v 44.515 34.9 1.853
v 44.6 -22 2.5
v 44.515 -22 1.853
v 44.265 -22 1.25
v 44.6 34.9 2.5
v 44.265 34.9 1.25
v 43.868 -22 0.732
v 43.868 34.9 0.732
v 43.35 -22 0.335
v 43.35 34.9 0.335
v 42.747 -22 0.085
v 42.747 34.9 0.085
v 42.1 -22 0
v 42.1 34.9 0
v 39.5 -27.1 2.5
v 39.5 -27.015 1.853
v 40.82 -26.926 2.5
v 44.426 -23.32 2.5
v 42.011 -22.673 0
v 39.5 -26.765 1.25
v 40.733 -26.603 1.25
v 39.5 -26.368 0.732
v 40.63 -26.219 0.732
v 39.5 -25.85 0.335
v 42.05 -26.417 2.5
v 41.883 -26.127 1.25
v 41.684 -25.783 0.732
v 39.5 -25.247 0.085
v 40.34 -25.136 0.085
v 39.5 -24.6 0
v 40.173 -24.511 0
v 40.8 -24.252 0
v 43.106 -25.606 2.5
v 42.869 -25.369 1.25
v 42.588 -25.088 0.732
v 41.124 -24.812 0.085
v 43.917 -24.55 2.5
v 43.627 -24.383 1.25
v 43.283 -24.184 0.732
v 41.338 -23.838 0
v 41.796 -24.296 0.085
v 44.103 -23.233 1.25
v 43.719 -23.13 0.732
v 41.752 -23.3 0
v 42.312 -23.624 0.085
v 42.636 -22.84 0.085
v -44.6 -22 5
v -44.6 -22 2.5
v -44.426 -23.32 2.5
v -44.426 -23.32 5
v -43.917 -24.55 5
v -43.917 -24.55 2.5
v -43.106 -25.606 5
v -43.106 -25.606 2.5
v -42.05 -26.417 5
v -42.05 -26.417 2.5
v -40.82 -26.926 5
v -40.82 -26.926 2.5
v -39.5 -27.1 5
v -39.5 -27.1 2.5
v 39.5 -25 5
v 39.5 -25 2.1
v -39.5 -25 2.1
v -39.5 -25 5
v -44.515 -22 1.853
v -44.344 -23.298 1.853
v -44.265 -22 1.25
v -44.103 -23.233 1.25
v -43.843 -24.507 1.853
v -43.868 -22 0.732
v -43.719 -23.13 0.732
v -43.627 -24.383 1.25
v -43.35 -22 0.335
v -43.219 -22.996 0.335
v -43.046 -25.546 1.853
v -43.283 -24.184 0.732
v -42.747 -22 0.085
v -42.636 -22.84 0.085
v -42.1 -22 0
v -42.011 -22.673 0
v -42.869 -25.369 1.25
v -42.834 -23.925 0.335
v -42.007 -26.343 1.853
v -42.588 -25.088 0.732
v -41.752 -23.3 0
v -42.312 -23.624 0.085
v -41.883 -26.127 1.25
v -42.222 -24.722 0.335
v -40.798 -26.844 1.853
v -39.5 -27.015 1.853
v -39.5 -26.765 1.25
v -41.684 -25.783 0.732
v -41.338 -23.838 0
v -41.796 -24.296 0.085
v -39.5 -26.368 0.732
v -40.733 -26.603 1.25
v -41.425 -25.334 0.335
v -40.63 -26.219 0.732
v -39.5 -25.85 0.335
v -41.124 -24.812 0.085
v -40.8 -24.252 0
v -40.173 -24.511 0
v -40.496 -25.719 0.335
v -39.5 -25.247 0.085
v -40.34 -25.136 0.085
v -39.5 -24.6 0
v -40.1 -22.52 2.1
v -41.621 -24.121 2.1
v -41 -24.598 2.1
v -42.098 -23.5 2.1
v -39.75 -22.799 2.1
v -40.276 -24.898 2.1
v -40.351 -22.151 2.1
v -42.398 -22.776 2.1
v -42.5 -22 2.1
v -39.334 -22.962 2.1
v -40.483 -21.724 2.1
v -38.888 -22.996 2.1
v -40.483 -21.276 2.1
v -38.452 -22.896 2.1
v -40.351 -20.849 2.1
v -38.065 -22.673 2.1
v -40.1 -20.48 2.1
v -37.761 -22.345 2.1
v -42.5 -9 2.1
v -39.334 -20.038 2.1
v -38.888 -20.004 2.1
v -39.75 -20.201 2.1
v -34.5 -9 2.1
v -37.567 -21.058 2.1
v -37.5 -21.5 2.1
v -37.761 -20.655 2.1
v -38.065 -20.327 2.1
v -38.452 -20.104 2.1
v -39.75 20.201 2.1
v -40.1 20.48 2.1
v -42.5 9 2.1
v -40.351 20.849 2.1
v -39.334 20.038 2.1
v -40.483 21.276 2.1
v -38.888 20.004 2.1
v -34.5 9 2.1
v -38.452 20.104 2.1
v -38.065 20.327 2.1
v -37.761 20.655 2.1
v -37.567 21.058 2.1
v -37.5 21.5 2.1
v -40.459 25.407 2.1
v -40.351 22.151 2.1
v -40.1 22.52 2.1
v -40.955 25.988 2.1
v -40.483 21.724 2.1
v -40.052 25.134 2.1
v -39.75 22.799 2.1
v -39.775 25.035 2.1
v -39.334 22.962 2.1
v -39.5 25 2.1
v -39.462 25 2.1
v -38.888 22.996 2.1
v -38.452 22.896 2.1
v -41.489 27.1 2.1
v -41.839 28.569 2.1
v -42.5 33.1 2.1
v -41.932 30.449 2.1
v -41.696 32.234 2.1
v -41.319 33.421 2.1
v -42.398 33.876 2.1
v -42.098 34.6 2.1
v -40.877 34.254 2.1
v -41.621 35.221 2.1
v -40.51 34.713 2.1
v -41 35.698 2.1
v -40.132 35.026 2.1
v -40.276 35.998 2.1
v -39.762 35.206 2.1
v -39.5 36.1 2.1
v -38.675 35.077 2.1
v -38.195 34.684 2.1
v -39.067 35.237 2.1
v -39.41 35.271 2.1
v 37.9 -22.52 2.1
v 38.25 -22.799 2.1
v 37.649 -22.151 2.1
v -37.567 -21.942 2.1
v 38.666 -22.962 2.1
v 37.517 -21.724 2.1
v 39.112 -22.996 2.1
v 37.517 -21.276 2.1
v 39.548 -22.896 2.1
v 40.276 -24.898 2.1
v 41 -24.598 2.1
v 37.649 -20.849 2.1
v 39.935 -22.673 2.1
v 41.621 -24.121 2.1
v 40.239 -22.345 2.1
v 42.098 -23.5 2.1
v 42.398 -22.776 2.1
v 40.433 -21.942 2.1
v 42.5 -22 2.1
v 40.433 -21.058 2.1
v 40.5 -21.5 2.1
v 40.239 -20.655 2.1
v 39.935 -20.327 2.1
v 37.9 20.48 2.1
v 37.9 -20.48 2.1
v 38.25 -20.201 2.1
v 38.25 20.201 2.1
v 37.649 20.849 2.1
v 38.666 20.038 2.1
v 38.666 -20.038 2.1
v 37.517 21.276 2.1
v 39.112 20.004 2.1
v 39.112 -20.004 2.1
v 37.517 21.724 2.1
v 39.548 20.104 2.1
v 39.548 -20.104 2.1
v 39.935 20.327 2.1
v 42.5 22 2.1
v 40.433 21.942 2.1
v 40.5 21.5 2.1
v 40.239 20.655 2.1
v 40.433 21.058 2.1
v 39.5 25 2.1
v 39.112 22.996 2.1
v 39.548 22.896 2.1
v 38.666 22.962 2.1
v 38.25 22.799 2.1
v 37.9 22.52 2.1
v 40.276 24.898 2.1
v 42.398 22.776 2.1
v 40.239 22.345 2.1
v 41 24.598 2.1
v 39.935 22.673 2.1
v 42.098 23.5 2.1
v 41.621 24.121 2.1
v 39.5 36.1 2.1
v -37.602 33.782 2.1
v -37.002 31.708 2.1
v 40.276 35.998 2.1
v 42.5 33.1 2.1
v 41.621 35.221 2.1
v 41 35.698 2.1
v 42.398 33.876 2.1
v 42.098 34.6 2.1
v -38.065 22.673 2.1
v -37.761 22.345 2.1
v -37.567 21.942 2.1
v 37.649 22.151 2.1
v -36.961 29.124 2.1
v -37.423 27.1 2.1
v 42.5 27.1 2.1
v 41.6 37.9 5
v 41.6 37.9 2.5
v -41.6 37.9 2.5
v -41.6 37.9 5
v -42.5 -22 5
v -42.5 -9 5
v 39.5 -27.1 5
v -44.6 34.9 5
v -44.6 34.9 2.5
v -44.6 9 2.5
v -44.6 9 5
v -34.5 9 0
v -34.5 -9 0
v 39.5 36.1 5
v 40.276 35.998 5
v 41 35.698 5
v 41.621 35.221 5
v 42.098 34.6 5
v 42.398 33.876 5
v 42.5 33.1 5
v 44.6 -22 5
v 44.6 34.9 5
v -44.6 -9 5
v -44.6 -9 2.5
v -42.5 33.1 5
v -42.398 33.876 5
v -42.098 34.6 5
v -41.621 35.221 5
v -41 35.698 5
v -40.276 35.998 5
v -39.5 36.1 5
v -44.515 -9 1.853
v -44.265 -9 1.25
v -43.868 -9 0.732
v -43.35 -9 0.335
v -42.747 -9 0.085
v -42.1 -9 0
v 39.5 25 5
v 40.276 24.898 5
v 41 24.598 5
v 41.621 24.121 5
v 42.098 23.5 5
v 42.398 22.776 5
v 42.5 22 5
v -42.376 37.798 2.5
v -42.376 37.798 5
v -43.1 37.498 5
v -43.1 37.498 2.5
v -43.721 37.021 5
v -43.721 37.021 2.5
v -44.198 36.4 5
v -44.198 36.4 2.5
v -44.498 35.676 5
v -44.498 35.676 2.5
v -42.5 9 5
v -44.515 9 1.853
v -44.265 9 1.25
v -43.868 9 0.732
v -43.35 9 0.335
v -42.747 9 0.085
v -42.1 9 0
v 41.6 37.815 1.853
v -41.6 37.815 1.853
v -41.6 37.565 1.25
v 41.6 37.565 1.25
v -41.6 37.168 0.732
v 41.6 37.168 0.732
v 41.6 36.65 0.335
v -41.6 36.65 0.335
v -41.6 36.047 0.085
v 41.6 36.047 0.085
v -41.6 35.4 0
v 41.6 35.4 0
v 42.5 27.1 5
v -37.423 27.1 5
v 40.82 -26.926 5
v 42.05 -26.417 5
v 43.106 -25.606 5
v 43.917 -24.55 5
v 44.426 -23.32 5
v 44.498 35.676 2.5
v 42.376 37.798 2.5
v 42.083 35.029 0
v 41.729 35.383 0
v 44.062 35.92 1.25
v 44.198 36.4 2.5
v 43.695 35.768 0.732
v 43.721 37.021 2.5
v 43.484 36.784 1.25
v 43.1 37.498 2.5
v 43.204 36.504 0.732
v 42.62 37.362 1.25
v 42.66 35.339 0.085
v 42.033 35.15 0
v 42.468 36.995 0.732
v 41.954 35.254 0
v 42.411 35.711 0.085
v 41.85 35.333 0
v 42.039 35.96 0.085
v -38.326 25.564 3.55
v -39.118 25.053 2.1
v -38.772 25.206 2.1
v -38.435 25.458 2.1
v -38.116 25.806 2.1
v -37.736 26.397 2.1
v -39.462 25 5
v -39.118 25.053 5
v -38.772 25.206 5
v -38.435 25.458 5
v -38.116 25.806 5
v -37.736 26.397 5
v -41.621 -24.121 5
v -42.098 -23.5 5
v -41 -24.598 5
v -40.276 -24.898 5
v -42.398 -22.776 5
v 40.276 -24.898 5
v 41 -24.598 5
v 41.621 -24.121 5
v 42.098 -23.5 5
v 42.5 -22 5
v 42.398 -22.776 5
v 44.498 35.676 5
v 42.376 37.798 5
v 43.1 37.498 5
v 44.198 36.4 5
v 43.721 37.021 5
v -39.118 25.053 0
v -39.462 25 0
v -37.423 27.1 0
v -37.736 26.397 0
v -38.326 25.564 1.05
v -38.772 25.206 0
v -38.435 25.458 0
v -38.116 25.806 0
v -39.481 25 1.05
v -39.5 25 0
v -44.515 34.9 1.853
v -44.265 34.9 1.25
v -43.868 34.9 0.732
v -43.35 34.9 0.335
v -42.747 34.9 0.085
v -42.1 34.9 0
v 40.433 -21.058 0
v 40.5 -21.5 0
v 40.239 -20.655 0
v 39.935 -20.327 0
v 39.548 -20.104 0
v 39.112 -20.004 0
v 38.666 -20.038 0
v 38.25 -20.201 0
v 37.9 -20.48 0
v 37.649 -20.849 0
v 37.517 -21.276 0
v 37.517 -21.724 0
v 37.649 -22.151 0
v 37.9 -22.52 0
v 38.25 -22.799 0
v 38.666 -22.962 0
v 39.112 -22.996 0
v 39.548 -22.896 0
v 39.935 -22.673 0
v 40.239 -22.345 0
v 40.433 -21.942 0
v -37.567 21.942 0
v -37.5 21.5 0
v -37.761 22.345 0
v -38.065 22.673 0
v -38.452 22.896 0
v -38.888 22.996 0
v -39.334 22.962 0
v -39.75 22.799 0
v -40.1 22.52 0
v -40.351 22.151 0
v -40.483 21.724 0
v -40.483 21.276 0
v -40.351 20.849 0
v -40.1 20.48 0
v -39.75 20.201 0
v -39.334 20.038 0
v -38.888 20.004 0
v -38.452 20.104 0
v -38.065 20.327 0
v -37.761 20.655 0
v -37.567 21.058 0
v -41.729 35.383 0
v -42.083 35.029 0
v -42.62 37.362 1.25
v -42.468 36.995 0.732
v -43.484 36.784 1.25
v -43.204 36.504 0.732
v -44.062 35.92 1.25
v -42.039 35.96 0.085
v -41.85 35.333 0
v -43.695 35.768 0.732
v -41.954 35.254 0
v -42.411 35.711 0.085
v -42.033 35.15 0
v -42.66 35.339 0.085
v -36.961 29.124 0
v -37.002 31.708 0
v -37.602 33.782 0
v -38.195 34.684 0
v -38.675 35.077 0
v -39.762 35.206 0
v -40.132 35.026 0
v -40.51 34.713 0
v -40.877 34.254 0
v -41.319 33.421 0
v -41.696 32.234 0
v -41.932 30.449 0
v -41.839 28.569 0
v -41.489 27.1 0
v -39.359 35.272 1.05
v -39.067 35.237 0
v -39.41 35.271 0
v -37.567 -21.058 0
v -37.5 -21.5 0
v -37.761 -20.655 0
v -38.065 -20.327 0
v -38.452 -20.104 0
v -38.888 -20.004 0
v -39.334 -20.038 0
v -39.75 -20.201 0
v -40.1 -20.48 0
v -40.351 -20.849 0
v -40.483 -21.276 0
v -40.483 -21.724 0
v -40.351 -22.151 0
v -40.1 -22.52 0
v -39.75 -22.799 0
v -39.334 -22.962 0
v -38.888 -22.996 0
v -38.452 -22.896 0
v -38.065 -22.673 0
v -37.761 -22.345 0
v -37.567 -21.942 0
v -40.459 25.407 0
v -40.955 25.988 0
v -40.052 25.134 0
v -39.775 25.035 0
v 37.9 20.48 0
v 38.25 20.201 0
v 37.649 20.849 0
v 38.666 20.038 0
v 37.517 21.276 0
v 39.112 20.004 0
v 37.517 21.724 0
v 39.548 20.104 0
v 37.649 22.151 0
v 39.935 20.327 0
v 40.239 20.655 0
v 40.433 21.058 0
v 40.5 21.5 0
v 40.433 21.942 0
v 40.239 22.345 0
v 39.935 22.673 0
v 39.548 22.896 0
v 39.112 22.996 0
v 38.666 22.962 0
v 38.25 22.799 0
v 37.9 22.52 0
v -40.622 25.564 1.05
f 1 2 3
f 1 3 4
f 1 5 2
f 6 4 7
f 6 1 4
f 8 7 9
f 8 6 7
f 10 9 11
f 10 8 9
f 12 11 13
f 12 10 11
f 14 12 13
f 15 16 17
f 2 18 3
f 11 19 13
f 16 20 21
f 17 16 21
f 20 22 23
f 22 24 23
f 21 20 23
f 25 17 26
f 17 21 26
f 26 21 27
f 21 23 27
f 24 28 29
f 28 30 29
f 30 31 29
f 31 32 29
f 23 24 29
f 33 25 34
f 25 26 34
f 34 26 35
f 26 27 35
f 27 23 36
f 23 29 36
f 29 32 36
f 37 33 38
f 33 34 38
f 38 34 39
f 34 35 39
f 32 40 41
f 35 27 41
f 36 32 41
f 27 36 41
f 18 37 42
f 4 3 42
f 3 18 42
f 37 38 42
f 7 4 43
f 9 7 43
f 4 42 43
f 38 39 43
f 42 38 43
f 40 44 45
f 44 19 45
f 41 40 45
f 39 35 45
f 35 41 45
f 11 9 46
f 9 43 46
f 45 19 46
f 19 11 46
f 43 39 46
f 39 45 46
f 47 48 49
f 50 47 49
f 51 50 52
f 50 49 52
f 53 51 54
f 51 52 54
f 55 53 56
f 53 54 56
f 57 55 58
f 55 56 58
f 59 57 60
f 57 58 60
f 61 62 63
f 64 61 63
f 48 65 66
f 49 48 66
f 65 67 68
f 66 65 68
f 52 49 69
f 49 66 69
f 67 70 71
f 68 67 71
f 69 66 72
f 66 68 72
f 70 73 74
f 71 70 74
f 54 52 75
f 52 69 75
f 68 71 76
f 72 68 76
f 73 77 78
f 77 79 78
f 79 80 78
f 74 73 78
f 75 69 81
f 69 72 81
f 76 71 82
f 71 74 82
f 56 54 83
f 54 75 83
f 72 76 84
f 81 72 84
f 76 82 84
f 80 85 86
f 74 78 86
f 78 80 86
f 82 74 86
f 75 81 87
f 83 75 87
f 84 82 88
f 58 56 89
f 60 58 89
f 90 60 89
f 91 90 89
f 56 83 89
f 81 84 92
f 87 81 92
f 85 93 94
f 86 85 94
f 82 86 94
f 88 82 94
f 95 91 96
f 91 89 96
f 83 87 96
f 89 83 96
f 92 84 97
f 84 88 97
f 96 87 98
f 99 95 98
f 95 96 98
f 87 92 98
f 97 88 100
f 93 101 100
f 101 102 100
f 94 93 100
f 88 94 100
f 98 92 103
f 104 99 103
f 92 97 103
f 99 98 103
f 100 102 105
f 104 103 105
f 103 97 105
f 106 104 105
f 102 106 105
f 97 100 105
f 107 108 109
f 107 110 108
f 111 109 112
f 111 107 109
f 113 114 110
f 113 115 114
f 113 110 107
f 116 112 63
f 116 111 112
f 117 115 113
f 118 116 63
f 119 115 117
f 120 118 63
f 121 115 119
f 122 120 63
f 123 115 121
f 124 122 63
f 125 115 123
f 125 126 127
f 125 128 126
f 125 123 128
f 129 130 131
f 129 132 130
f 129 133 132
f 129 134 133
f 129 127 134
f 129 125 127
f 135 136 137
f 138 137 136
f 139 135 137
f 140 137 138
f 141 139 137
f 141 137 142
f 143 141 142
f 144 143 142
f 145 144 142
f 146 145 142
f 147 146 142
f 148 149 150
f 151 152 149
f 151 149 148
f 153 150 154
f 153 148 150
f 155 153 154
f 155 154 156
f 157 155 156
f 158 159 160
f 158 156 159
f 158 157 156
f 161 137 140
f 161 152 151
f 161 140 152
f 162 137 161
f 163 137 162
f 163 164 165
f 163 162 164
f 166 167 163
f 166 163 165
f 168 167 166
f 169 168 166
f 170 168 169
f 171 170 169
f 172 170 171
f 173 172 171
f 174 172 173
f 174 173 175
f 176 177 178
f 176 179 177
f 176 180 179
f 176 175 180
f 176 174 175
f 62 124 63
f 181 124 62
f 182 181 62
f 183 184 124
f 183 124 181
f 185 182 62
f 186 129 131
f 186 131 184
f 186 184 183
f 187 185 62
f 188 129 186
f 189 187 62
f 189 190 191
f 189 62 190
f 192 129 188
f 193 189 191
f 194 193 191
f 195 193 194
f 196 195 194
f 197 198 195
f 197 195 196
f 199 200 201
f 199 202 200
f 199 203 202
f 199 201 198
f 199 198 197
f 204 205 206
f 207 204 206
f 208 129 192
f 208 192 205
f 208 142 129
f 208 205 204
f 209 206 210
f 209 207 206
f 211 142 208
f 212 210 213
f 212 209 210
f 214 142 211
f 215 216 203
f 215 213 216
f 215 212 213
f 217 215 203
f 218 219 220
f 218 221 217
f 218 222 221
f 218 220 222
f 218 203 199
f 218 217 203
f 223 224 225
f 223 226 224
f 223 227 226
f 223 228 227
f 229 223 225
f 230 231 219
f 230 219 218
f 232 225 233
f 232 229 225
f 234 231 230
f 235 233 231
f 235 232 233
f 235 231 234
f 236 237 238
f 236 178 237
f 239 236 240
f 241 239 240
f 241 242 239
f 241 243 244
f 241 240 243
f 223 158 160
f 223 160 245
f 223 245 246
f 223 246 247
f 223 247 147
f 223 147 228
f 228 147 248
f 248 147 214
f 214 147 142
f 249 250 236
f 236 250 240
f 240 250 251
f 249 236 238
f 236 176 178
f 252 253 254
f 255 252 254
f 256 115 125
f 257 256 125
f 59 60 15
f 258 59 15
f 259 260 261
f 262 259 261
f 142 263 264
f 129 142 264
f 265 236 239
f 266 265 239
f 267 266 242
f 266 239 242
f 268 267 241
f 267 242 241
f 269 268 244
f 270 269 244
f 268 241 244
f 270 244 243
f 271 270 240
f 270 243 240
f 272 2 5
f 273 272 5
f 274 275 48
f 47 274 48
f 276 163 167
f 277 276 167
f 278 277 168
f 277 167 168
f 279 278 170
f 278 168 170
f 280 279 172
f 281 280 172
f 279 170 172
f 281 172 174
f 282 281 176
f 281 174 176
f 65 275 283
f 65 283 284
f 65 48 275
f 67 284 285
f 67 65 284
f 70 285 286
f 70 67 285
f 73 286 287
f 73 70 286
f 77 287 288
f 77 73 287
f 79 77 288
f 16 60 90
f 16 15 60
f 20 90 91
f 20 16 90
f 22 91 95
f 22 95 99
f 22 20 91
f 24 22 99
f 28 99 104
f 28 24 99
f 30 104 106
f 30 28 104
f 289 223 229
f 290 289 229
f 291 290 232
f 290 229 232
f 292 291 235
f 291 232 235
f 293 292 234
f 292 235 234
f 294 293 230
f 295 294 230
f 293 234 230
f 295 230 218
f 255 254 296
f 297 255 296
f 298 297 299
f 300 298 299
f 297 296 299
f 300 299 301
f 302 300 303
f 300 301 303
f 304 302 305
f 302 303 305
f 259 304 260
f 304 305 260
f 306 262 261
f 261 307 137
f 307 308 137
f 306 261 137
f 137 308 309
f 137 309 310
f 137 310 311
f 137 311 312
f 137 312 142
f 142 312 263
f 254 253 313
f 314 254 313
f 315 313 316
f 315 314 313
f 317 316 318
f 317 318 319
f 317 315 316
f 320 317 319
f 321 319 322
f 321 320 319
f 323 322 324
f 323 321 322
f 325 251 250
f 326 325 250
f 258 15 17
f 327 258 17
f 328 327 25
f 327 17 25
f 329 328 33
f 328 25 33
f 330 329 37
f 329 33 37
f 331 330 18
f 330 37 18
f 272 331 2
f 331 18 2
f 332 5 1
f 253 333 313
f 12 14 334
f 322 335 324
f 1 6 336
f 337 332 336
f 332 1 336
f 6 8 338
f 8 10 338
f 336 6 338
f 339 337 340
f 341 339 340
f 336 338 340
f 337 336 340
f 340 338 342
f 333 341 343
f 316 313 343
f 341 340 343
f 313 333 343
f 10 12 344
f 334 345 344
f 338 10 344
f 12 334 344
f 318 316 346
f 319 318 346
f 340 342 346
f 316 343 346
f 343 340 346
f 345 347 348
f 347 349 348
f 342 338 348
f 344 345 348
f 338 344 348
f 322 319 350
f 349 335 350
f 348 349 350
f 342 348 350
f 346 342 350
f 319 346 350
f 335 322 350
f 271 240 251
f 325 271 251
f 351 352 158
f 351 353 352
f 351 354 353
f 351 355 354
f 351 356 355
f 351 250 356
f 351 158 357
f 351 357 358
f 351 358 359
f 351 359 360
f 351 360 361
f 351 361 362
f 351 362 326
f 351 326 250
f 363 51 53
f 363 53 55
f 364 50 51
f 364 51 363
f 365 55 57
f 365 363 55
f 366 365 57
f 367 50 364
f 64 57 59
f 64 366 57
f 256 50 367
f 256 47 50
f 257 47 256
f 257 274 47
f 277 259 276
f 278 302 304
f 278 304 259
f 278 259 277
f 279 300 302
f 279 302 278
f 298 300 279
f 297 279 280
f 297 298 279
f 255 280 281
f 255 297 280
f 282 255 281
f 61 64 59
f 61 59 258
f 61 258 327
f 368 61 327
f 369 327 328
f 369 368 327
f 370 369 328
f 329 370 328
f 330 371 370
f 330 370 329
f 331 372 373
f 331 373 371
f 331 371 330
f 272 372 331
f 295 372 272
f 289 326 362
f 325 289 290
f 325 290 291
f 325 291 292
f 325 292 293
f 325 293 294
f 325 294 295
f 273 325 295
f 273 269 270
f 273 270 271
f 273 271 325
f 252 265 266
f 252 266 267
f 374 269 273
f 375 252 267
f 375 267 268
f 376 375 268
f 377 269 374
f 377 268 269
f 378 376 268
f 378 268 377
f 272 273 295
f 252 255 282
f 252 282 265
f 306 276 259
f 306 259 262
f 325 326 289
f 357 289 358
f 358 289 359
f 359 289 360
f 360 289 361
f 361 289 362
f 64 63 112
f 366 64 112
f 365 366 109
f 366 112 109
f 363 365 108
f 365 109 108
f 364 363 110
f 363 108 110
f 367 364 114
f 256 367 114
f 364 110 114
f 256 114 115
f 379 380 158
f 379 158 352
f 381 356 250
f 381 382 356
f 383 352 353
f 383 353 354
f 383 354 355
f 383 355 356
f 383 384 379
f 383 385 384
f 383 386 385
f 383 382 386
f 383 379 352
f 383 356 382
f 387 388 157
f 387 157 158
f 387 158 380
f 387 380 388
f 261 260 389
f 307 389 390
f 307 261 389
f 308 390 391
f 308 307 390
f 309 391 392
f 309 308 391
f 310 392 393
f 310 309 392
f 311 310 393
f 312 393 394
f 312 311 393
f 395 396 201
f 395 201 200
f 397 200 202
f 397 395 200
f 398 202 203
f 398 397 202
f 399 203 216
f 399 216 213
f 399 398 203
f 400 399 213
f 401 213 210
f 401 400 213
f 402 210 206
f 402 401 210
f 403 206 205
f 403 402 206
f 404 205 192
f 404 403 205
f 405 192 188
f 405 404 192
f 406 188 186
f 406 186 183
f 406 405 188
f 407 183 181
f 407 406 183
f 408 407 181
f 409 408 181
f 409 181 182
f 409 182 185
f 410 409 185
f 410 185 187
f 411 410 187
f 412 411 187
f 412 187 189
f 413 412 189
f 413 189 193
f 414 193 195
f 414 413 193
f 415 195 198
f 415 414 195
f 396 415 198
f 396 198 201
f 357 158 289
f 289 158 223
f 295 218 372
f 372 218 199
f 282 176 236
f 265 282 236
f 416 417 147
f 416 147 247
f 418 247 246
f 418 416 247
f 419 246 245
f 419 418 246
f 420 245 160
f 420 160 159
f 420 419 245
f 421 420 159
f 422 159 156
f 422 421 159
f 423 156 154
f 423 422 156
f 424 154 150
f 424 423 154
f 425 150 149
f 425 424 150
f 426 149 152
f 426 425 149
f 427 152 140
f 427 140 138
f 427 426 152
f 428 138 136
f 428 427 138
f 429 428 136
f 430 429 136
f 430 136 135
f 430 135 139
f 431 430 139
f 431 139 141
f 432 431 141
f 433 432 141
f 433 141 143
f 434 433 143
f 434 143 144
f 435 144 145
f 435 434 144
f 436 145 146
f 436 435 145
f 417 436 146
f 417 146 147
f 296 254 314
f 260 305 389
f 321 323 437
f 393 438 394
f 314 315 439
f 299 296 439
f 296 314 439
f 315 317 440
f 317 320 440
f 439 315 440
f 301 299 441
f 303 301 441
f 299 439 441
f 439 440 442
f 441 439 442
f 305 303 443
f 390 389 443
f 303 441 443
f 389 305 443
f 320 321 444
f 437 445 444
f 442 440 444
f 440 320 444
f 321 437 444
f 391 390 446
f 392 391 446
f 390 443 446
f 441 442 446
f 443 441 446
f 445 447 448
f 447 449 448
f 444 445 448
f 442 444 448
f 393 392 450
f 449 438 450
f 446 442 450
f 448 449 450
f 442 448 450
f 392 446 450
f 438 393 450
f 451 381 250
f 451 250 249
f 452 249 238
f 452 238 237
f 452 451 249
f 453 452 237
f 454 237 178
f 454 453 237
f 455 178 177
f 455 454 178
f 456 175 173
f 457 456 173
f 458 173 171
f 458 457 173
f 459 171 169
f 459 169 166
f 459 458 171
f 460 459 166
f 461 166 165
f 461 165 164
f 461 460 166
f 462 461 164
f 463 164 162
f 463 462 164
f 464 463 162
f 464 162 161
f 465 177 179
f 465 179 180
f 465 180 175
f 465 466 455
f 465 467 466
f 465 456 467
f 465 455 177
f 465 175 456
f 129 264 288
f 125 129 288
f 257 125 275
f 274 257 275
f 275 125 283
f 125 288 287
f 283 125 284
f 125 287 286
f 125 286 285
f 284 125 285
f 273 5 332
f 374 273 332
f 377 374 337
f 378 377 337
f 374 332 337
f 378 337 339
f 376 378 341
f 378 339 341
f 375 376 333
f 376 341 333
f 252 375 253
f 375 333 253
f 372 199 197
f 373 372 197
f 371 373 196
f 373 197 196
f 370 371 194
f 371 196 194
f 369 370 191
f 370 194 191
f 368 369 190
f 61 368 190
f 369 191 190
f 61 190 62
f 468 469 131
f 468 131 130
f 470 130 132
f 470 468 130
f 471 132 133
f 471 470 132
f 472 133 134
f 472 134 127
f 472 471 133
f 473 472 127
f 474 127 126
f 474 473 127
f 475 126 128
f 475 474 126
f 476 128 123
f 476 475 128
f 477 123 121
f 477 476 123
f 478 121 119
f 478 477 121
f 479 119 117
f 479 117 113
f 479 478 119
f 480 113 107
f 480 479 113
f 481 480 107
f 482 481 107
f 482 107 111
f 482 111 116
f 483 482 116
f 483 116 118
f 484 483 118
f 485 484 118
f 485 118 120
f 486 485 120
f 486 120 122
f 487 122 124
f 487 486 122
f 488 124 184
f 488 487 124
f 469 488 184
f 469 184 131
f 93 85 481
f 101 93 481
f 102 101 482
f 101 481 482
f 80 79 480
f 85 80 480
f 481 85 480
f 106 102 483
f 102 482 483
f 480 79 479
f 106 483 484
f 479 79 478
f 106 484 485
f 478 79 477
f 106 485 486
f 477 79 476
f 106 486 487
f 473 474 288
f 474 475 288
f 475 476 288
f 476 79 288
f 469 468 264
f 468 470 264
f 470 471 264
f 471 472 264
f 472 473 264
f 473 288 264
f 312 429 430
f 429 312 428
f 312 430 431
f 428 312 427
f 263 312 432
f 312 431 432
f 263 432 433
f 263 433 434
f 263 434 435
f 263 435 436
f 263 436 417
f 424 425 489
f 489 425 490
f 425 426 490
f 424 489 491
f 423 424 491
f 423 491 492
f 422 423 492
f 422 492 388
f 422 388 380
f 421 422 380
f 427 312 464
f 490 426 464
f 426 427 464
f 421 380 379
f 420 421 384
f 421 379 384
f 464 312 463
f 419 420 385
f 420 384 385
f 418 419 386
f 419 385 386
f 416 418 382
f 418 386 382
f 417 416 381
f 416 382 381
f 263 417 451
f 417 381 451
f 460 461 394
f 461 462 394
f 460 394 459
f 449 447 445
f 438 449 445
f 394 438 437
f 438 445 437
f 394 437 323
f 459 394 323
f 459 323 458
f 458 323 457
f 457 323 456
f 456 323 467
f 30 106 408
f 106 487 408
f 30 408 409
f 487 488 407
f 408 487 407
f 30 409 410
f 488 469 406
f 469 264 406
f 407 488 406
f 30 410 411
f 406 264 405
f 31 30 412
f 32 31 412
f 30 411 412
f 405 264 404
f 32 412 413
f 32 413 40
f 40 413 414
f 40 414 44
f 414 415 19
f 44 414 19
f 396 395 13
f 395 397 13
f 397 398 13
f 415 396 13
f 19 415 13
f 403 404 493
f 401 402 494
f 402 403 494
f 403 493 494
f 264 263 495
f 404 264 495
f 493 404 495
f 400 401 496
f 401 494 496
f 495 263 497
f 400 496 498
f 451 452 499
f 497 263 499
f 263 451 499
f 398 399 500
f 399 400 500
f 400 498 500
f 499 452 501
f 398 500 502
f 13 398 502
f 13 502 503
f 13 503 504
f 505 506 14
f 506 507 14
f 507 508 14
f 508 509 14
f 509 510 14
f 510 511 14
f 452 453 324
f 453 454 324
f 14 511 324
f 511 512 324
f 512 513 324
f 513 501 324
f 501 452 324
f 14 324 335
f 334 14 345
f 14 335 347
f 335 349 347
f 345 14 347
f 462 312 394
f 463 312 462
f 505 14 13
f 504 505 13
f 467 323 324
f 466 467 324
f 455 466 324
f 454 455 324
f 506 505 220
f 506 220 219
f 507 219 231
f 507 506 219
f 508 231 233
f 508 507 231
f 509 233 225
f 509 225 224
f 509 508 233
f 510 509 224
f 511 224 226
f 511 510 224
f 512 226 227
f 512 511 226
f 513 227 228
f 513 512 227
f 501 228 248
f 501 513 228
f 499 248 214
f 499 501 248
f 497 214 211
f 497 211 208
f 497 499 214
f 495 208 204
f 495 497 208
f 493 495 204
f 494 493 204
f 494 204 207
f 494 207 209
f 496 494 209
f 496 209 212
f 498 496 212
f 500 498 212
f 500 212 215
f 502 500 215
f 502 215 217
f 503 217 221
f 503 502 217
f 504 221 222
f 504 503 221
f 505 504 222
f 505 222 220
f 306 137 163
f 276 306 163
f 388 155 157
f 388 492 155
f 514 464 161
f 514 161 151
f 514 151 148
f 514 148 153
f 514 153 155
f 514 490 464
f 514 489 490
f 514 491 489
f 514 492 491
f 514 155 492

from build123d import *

# Parameters (mm, degrees)
F0_R     = 1.5
F1_DEPTH = 2.1
F2_DEPTH = 5
F3_R     = 2.5


with BuildPart() as f1:
    # F0 (on Top) → F1 (new body)
    with BuildSketch(Plane.XY):
        with BuildLine():
            Line((39.5, -25), (34.5, -25))
            Line((34.5, -25), (-34.5, -25))
            Line((-34.5, -25), (-39.5, -25))
            ThreePointArc((-39.5, -25), (-41.62132, -24.12132), (-42.5, -22))
            Line((-42.5, -22), (-42.5, -9))
            Line((-42.5, -9), (-44.6, -9))
            Line((-44.6, -9), (-44.6, -22))
            ThreePointArc((-44.6, -22), (-43.106245, -25.606245), (-39.5, -27.1))
            Line((-39.5, -27.1), (39.5, -27.1))
            ThreePointArc((39.5, -27.1), (43.106245, -25.606245), (44.6, -22))
            Line((44.6, -22), (44.6, 22))
            Line((44.6, 22), (44.6, 34.9))
            ThreePointArc((44.6, 34.9), (43.72132, 37.02132), (41.6, 37.9))
            Line((41.6, 37.9), (0, 37.9))
            Line((0, 37.9), (-41.6, 37.9))
            ThreePointArc((-41.6, 37.9), (-43.72132, 37.02132), (-44.6, 34.9))
            Line((-44.6, 34.9), (-44.6, 22))
            Line((-44.6, 22), (-44.6, 9))
            Line((-44.6, 9), (-42.5, 9))
            Line((-42.5, 9), (-42.5, 22))
            Line((-42.5, 22), (-42.5, 27.1))
            Line((-42.5, 27.1), (-42.5, 33.1))
            ThreePointArc((-42.5, 33.1), (-41.62132, 35.22132), (-39.5, 36.1))
            Line((-39.5, 36.1), (0, 36.1))
            Line((0, 36.1), (39.5, 36.1))
            ThreePointArc((39.5, 36.1), (41.62132, 35.22132), (42.5, 33.1))
            Line((42.5, 33.1), (42.5, 27.1))
            Line((42.5, 27.1), (42.5, 22))
            Line((42.5, 22), (42.5, -22))
            ThreePointArc((42.5, -22), (41.62132, -24.12132), (39.5, -25))
        make_face()
        with BuildLine():
            Line((-34.5, 9), (-34.5, 25))
            Line((-34.5, 25), (-39.461525, 25))
            add(Edge.make_bspline(
                [(-39.5, 25), (-39.480766, 24.999701), (-39.461525, 25)],
                knots=[0, 0, 0, 0.015266, 0.015266, 0.015266], degree=2, weights=[1, 0.999971, 1]))
            ThreePointArc((-39.5, 25), (-41.62132, 24.12132), (-42.5, 22))
            Line((-42.5, 22), (-42.5, 9))
            Line((-42.5, 9), (-34.5, 9))
        make_face()
        with Locations((-39, 21.5)):
            Circle(F0_R, mode=Mode.SUBTRACT)
        with BuildLine():
            Line((-34.5, -25), (-34.5, -9))
            Line((-34.5, -9), (-42.5, -9))
            Line((-42.5, -9), (-42.5, -22))
            ThreePointArc((-42.5, -22), (-41.62132, -24.12132), (-39.5, -25))
            Line((-39.5, -25), (-34.5, -25))
        make_face()
        with Locations((-39, -21.5)):
            Circle(F0_R, mode=Mode.SUBTRACT)
        Polygon((34.5, 25), (-34.5, 25), (-34.5, 9), (-34.5, -9), (-34.5, -25), (34.5, -25), align=None)
        with BuildLine():
            Line((39.5, 25), (34.5, 25))
            Line((34.5, 25), (34.5, -25))
            Line((34.5, -25), (39.5, -25))
            ThreePointArc((39.5, -25), (41.62132, -24.12132), (42.5, -22))
            Line((42.5, -22), (42.5, 22))
            ThreePointArc((42.5, 22), (41.62132, 24.12132), (39.5, 25))
        make_face()
        with Locations((39, -21.5)):
            Circle(F0_R, mode=Mode.SUBTRACT)
        with Locations((39, 21.5)):
            Circle(F0_R, mode=Mode.SUBTRACT)
        with BuildLine():
            ThreePointArc((-42.5, 22), (-41.62132, 24.12132), (-39.5, 25))
            add(Edge.make_bspline(
                [(-41.488852, 27.1), (-40.765333, 25.019686), (-39.5, 25)],
                knots=[5.35244, 5.35244, 5.35244, 6.283185, 6.283185, 6.283185], degree=2, weights=[1, 0.893654, 1]))
            Line((-41.488852, 27.1), (-42.5, 27.1))
            Line((-42.5, 27.1), (-42.5, 22))
        make_face()
        with BuildLine():
            add(Edge.make_bspline(
                [(-37.42306, 27.1), (-34.387845, 35.271957), (-39.359425, 35.271957), (-44.331004, 35.271957), (-41.488852, 27.1)],
                knots=[0.946012, 0.946012, 0.946012, 3.149226, 3.149226, 5.35244, 5.35244, 5.35244], degree=2, weights=[1, 0.452163, 1, 0.452163, 1]))
            Line((-37.42306, 27.1), (39.5, 27.1))
            Line((39.5, 27.1), (42.5, 27.1))
            Line((42.5, 27.1), (42.5, 33.1))
            ThreePointArc((42.5, 33.1), (41.62132, 35.22132), (39.5, 36.1))
            Line((39.5, 36.1), (0, 36.1))
            Line((0, 36.1), (-39.5, 36.1))
            ThreePointArc((-39.5, 36.1), (-41.62132, 35.22132), (-42.5, 33.1))
            Line((-42.5, 33.1), (-42.5, 27.1))
            Line((-42.5, 27.1), (-41.488852, 27.1))
        make_face()
        with BuildLine():
            Line((-39.461525, 25), (-34.5, 25))
            Line((-34.5, 25), (34.5, 25))
            Line((34.5, 25), (39.5, 25))
            ThreePointArc((39.5, 25), (41.62132, 24.12132), (42.5, 22))
            Line((42.5, 22), (42.5, 27.1))
            Line((42.5, 27.1), (39.5, 27.1))
            Line((39.5, 27.1), (-37.42306, 27.1))
            add(Edge.make_bspline(
                [(-39.461525, 25), (-38.195727, 25.019686), (-37.42306, 27.1)],
                knots=[0.015266, 0.015266, 0.015266, 0.946012, 0.946012, 0.946012], degree=2, weights=[1, 0.893654, 1]))
        make_face()
    extrude(amount=F1_DEPTH)

    # F0 (on Top) → F2 (join)
    with BuildSketch(Plane.XY):
        with BuildLine():
            Line((39.5, -25), (34.5, -25))
            Line((34.5, -25), (-34.5, -25))
            Line((-34.5, -25), (-39.5, -25))
            ThreePointArc((-39.5, -25), (-41.62132, -24.12132), (-42.5, -22))
            Line((-42.5, -22), (-42.5, -9))
            Line((-42.5, -9), (-44.6, -9))
            Line((-44.6, -9), (-44.6, -22))
            ThreePointArc((-44.6, -22), (-43.106245, -25.606245), (-39.5, -27.1))
            Line((-39.5, -27.1), (39.5, -27.1))
            ThreePointArc((39.5, -27.1), (43.106245, -25.606245), (44.6, -22))
            Line((44.6, -22), (44.6, 22))
            Line((44.6, 22), (44.6, 34.9))
            ThreePointArc((44.6, 34.9), (43.72132, 37.02132), (41.6, 37.9))
            Line((41.6, 37.9), (0, 37.9))
            Line((0, 37.9), (-41.6, 37.9))
            ThreePointArc((-41.6, 37.9), (-43.72132, 37.02132), (-44.6, 34.9))
            Line((-44.6, 34.9), (-44.6, 22))
            Line((-44.6, 22), (-44.6, 9))
            Line((-44.6, 9), (-42.5, 9))
            Line((-42.5, 9), (-42.5, 22))
            Line((-42.5, 22), (-42.5, 27.1))
            Line((-42.5, 27.1), (-42.5, 33.1))
            ThreePointArc((-42.5, 33.1), (-41.62132, 35.22132), (-39.5, 36.1))
            Line((-39.5, 36.1), (0, 36.1))
            Line((0, 36.1), (39.5, 36.1))
            ThreePointArc((39.5, 36.1), (41.62132, 35.22132), (42.5, 33.1))
            Line((42.5, 33.1), (42.5, 27.1))
            Line((42.5, 27.1), (42.5, 22))
            Line((42.5, 22), (42.5, -22))
            ThreePointArc((42.5, -22), (41.62132, -24.12132), (39.5, -25))
        make_face()
        with BuildLine():
            Line((-39.461525, 25), (-34.5, 25))
            Line((-34.5, 25), (34.5, 25))
            Line((34.5, 25), (39.5, 25))
            ThreePointArc((39.5, 25), (41.62132, 24.12132), (42.5, 22))
            Line((42.5, 22), (42.5, 27.1))
            Line((42.5, 27.1), (39.5, 27.1))
            Line((39.5, 27.1), (-37.42306, 27.1))
            add(Edge.make_bspline(
                [(-39.461525, 25), (-38.195727, 25.019686), (-37.42306, 27.1)],
                knots=[0.015266, 0.015266, 0.015266, 0.946012, 0.946012, 0.946012], degree=2, weights=[1, 0.893654, 1]))
        make_face()
    extrude(amount=F2_DEPTH)

    # F3
    f3_edges = [f1.edges().sort_by_distance(p)[0] for p in [
        (44.6, 6.45, 0),
    ]]
    fillet(f3_edges, radius=F3_R)


solid = f1.part
